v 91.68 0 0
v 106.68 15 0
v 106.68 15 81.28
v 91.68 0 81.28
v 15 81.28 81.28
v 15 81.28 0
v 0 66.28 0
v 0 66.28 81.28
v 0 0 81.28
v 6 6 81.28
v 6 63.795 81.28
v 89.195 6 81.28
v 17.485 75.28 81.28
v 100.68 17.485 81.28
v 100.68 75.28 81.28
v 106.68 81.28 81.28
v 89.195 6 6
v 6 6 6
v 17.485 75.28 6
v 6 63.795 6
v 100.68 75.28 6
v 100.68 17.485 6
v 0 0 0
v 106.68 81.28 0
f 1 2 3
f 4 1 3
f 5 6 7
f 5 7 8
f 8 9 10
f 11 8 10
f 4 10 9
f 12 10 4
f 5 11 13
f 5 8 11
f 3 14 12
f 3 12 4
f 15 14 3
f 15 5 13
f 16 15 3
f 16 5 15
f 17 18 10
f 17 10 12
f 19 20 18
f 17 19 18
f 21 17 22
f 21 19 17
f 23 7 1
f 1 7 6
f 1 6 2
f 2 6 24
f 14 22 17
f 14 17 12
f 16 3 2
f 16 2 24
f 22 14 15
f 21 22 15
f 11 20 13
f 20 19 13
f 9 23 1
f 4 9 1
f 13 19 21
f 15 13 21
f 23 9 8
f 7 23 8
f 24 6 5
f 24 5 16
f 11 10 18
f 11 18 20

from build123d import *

# Parameters (mm, degrees)
SKETCH1_W           = 106.68
SKETCH1_H           = 81.28
BOSS_EXTRUDE1_DEPTH = 81.28
CHAMFER1_SIZE       = 15
SHELL2_T            = -6


with BuildPart() as part:
    # Sketch1 → Boss-Extrude1 (new body)
    with BuildSketch(Plane.XY):
        with Locations((53.34, 40.64)):
            Rectangle(SKETCH1_W, SKETCH1_H)
    extrude(amount=BOSS_EXTRUDE1_DEPTH)

    # Chamfer1
    chamfer1_edges = [part.edges().sort_by_distance(p)[0] for p in [
        (0, 81.28, 40.64),
        (106.68, 0, 40.64),
    ]]
    chamfer(chamfer1_edges, length=CHAMFER1_SIZE)

    # Shell2
    shell2_openings = [part.faces().sort_by_distance(p)[0] for p in [
        (53.34, 40.64, 81.28),
    ]]
    offset(amount=SHELL2_T, openings=shell2_openings, kind=Kind.INTERSECTION)


solid = part.part
